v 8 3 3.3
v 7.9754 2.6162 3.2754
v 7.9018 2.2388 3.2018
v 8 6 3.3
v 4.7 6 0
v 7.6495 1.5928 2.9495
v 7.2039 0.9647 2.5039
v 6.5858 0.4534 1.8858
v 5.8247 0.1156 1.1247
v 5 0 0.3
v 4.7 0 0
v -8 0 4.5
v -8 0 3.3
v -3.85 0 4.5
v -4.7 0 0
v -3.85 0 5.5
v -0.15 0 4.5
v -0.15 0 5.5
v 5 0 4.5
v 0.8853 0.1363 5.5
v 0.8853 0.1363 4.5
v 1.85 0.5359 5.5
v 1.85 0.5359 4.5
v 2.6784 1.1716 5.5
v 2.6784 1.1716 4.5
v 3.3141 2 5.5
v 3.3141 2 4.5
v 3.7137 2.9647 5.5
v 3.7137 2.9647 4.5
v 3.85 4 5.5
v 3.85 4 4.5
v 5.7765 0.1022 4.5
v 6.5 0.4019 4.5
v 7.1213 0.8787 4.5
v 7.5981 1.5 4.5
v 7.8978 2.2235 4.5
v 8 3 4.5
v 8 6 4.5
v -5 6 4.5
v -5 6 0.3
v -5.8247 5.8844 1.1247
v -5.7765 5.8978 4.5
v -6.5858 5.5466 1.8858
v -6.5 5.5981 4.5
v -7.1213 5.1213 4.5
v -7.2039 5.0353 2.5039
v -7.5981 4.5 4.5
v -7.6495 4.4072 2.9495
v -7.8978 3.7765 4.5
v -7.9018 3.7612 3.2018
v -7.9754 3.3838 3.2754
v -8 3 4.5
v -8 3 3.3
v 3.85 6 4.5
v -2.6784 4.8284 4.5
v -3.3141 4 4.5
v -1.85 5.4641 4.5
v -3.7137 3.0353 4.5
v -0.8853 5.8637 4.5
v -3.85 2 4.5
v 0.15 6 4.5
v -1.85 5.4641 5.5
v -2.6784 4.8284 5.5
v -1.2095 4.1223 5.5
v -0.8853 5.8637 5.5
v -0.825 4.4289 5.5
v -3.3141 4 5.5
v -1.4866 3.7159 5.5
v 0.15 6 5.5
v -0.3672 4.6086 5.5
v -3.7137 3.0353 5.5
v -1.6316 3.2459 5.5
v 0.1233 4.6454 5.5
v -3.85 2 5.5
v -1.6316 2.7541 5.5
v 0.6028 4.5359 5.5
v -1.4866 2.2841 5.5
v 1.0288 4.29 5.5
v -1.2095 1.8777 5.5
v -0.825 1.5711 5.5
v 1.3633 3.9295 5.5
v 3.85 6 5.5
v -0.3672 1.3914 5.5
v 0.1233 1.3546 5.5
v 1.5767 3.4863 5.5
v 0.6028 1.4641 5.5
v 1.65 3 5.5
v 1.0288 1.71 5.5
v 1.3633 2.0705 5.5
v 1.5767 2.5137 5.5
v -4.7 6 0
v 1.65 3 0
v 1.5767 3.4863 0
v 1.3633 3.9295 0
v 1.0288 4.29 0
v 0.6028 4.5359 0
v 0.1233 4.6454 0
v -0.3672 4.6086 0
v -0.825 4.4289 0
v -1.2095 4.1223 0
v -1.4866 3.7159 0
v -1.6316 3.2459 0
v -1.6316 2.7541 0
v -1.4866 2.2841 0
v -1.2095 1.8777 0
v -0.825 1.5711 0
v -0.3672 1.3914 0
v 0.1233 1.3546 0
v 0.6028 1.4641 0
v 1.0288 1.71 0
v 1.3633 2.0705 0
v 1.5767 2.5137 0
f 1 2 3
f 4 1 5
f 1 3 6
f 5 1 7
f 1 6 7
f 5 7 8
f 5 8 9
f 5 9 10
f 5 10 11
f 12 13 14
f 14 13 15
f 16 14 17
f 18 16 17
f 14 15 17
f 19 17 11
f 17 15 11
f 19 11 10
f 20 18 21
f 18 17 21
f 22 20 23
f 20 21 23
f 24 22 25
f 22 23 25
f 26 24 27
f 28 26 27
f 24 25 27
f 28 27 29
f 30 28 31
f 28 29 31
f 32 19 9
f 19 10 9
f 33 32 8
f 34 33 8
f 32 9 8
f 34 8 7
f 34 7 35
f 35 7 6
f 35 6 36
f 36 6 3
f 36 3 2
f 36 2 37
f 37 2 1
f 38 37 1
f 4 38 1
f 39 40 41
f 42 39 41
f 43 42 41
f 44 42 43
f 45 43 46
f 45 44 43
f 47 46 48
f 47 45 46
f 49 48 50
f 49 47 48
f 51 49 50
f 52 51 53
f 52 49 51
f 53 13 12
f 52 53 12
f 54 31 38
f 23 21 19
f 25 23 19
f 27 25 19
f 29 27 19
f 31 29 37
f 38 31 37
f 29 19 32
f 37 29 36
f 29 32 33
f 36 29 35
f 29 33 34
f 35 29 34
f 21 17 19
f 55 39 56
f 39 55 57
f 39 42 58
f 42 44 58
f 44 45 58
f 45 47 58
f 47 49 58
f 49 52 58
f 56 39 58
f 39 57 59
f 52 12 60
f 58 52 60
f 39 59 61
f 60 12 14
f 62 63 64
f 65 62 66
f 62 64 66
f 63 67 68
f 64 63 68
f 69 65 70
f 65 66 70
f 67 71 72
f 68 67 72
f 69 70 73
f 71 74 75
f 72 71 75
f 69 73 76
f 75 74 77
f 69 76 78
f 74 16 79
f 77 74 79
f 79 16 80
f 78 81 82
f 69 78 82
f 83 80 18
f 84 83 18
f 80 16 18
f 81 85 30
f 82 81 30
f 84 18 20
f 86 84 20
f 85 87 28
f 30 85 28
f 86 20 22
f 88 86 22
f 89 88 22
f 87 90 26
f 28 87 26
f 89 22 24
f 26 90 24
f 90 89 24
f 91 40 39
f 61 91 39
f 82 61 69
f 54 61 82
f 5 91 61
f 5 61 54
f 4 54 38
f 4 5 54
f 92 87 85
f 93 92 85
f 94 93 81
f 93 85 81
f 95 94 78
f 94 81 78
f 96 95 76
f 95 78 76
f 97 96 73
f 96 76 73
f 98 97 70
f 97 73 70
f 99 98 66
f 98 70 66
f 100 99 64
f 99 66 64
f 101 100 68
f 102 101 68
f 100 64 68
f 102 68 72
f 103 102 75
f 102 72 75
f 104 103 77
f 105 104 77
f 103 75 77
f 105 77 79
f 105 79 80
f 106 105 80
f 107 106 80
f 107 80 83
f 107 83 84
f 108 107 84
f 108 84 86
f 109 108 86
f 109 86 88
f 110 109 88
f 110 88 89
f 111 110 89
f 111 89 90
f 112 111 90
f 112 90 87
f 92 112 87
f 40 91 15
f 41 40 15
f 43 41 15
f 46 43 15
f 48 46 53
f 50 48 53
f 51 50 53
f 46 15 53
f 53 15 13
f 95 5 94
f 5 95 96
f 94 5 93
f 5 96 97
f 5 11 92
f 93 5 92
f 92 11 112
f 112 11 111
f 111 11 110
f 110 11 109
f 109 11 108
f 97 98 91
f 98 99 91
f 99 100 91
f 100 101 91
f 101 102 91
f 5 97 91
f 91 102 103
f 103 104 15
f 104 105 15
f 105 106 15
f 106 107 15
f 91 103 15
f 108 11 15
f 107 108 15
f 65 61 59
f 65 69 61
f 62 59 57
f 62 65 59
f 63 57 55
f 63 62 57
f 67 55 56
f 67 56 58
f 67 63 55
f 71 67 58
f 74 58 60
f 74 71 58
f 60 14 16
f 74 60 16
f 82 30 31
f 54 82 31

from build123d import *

# Parameters (mm, degrees)
BOSS_EXTRUDE1_DEPTH = 6
SKETCH2_R           = 1.65
CUT_EXTRUDE1_DEPTH  = 6.5
FILLET1_R           = 4
FILLET2_R           = 3


with BuildPart() as part:
    # Sketch1 → Boss-Extrude1 (new body)
    with BuildSketch(Plane(origin=(0, 0, 0), x_dir=(1, 0, 0), z_dir=(0, 1, 0))):
        Polygon((4.7, 0), (-4.7, 0), (-8, -3.3), (-8, -4.5), (-3.85, -4.5), (-3.85, -5.5), (3.85, -5.5), (3.85, -4.5), (8, -4.5), (8, -3.3), align=None)
    extrude(amount=BOSS_EXTRUDE1_DEPTH)

    # Sketch2 → Cut-Extrude1 (cut, through all)
    with BuildSketch(Plane.XY.offset(5.5)):
        with Locations((0, 3)):
            Circle(SKETCH2_R)
    extrude(amount=-CUT_EXTRUDE1_DEPTH, mode=Mode.SUBTRACT)

    # Fillet1
    fillet1_edges = [part.edges().sort_by_distance(p)[0] for p in [
        (3.85, 0, 5),
        (-3.85, 6, 5),
    ]]
    fillet(fillet1_edges, radius=FILLET1_R)

    # Fillet2
    fillet2_edges = [part.edges().sort_by_distance(p)[0] for p in [
        (8, 0, 3.9),
        (-8, 6, 3.9),
    ]]
    fillet(fillet2_edges, radius=FILLET2_R)


solid = part.part
